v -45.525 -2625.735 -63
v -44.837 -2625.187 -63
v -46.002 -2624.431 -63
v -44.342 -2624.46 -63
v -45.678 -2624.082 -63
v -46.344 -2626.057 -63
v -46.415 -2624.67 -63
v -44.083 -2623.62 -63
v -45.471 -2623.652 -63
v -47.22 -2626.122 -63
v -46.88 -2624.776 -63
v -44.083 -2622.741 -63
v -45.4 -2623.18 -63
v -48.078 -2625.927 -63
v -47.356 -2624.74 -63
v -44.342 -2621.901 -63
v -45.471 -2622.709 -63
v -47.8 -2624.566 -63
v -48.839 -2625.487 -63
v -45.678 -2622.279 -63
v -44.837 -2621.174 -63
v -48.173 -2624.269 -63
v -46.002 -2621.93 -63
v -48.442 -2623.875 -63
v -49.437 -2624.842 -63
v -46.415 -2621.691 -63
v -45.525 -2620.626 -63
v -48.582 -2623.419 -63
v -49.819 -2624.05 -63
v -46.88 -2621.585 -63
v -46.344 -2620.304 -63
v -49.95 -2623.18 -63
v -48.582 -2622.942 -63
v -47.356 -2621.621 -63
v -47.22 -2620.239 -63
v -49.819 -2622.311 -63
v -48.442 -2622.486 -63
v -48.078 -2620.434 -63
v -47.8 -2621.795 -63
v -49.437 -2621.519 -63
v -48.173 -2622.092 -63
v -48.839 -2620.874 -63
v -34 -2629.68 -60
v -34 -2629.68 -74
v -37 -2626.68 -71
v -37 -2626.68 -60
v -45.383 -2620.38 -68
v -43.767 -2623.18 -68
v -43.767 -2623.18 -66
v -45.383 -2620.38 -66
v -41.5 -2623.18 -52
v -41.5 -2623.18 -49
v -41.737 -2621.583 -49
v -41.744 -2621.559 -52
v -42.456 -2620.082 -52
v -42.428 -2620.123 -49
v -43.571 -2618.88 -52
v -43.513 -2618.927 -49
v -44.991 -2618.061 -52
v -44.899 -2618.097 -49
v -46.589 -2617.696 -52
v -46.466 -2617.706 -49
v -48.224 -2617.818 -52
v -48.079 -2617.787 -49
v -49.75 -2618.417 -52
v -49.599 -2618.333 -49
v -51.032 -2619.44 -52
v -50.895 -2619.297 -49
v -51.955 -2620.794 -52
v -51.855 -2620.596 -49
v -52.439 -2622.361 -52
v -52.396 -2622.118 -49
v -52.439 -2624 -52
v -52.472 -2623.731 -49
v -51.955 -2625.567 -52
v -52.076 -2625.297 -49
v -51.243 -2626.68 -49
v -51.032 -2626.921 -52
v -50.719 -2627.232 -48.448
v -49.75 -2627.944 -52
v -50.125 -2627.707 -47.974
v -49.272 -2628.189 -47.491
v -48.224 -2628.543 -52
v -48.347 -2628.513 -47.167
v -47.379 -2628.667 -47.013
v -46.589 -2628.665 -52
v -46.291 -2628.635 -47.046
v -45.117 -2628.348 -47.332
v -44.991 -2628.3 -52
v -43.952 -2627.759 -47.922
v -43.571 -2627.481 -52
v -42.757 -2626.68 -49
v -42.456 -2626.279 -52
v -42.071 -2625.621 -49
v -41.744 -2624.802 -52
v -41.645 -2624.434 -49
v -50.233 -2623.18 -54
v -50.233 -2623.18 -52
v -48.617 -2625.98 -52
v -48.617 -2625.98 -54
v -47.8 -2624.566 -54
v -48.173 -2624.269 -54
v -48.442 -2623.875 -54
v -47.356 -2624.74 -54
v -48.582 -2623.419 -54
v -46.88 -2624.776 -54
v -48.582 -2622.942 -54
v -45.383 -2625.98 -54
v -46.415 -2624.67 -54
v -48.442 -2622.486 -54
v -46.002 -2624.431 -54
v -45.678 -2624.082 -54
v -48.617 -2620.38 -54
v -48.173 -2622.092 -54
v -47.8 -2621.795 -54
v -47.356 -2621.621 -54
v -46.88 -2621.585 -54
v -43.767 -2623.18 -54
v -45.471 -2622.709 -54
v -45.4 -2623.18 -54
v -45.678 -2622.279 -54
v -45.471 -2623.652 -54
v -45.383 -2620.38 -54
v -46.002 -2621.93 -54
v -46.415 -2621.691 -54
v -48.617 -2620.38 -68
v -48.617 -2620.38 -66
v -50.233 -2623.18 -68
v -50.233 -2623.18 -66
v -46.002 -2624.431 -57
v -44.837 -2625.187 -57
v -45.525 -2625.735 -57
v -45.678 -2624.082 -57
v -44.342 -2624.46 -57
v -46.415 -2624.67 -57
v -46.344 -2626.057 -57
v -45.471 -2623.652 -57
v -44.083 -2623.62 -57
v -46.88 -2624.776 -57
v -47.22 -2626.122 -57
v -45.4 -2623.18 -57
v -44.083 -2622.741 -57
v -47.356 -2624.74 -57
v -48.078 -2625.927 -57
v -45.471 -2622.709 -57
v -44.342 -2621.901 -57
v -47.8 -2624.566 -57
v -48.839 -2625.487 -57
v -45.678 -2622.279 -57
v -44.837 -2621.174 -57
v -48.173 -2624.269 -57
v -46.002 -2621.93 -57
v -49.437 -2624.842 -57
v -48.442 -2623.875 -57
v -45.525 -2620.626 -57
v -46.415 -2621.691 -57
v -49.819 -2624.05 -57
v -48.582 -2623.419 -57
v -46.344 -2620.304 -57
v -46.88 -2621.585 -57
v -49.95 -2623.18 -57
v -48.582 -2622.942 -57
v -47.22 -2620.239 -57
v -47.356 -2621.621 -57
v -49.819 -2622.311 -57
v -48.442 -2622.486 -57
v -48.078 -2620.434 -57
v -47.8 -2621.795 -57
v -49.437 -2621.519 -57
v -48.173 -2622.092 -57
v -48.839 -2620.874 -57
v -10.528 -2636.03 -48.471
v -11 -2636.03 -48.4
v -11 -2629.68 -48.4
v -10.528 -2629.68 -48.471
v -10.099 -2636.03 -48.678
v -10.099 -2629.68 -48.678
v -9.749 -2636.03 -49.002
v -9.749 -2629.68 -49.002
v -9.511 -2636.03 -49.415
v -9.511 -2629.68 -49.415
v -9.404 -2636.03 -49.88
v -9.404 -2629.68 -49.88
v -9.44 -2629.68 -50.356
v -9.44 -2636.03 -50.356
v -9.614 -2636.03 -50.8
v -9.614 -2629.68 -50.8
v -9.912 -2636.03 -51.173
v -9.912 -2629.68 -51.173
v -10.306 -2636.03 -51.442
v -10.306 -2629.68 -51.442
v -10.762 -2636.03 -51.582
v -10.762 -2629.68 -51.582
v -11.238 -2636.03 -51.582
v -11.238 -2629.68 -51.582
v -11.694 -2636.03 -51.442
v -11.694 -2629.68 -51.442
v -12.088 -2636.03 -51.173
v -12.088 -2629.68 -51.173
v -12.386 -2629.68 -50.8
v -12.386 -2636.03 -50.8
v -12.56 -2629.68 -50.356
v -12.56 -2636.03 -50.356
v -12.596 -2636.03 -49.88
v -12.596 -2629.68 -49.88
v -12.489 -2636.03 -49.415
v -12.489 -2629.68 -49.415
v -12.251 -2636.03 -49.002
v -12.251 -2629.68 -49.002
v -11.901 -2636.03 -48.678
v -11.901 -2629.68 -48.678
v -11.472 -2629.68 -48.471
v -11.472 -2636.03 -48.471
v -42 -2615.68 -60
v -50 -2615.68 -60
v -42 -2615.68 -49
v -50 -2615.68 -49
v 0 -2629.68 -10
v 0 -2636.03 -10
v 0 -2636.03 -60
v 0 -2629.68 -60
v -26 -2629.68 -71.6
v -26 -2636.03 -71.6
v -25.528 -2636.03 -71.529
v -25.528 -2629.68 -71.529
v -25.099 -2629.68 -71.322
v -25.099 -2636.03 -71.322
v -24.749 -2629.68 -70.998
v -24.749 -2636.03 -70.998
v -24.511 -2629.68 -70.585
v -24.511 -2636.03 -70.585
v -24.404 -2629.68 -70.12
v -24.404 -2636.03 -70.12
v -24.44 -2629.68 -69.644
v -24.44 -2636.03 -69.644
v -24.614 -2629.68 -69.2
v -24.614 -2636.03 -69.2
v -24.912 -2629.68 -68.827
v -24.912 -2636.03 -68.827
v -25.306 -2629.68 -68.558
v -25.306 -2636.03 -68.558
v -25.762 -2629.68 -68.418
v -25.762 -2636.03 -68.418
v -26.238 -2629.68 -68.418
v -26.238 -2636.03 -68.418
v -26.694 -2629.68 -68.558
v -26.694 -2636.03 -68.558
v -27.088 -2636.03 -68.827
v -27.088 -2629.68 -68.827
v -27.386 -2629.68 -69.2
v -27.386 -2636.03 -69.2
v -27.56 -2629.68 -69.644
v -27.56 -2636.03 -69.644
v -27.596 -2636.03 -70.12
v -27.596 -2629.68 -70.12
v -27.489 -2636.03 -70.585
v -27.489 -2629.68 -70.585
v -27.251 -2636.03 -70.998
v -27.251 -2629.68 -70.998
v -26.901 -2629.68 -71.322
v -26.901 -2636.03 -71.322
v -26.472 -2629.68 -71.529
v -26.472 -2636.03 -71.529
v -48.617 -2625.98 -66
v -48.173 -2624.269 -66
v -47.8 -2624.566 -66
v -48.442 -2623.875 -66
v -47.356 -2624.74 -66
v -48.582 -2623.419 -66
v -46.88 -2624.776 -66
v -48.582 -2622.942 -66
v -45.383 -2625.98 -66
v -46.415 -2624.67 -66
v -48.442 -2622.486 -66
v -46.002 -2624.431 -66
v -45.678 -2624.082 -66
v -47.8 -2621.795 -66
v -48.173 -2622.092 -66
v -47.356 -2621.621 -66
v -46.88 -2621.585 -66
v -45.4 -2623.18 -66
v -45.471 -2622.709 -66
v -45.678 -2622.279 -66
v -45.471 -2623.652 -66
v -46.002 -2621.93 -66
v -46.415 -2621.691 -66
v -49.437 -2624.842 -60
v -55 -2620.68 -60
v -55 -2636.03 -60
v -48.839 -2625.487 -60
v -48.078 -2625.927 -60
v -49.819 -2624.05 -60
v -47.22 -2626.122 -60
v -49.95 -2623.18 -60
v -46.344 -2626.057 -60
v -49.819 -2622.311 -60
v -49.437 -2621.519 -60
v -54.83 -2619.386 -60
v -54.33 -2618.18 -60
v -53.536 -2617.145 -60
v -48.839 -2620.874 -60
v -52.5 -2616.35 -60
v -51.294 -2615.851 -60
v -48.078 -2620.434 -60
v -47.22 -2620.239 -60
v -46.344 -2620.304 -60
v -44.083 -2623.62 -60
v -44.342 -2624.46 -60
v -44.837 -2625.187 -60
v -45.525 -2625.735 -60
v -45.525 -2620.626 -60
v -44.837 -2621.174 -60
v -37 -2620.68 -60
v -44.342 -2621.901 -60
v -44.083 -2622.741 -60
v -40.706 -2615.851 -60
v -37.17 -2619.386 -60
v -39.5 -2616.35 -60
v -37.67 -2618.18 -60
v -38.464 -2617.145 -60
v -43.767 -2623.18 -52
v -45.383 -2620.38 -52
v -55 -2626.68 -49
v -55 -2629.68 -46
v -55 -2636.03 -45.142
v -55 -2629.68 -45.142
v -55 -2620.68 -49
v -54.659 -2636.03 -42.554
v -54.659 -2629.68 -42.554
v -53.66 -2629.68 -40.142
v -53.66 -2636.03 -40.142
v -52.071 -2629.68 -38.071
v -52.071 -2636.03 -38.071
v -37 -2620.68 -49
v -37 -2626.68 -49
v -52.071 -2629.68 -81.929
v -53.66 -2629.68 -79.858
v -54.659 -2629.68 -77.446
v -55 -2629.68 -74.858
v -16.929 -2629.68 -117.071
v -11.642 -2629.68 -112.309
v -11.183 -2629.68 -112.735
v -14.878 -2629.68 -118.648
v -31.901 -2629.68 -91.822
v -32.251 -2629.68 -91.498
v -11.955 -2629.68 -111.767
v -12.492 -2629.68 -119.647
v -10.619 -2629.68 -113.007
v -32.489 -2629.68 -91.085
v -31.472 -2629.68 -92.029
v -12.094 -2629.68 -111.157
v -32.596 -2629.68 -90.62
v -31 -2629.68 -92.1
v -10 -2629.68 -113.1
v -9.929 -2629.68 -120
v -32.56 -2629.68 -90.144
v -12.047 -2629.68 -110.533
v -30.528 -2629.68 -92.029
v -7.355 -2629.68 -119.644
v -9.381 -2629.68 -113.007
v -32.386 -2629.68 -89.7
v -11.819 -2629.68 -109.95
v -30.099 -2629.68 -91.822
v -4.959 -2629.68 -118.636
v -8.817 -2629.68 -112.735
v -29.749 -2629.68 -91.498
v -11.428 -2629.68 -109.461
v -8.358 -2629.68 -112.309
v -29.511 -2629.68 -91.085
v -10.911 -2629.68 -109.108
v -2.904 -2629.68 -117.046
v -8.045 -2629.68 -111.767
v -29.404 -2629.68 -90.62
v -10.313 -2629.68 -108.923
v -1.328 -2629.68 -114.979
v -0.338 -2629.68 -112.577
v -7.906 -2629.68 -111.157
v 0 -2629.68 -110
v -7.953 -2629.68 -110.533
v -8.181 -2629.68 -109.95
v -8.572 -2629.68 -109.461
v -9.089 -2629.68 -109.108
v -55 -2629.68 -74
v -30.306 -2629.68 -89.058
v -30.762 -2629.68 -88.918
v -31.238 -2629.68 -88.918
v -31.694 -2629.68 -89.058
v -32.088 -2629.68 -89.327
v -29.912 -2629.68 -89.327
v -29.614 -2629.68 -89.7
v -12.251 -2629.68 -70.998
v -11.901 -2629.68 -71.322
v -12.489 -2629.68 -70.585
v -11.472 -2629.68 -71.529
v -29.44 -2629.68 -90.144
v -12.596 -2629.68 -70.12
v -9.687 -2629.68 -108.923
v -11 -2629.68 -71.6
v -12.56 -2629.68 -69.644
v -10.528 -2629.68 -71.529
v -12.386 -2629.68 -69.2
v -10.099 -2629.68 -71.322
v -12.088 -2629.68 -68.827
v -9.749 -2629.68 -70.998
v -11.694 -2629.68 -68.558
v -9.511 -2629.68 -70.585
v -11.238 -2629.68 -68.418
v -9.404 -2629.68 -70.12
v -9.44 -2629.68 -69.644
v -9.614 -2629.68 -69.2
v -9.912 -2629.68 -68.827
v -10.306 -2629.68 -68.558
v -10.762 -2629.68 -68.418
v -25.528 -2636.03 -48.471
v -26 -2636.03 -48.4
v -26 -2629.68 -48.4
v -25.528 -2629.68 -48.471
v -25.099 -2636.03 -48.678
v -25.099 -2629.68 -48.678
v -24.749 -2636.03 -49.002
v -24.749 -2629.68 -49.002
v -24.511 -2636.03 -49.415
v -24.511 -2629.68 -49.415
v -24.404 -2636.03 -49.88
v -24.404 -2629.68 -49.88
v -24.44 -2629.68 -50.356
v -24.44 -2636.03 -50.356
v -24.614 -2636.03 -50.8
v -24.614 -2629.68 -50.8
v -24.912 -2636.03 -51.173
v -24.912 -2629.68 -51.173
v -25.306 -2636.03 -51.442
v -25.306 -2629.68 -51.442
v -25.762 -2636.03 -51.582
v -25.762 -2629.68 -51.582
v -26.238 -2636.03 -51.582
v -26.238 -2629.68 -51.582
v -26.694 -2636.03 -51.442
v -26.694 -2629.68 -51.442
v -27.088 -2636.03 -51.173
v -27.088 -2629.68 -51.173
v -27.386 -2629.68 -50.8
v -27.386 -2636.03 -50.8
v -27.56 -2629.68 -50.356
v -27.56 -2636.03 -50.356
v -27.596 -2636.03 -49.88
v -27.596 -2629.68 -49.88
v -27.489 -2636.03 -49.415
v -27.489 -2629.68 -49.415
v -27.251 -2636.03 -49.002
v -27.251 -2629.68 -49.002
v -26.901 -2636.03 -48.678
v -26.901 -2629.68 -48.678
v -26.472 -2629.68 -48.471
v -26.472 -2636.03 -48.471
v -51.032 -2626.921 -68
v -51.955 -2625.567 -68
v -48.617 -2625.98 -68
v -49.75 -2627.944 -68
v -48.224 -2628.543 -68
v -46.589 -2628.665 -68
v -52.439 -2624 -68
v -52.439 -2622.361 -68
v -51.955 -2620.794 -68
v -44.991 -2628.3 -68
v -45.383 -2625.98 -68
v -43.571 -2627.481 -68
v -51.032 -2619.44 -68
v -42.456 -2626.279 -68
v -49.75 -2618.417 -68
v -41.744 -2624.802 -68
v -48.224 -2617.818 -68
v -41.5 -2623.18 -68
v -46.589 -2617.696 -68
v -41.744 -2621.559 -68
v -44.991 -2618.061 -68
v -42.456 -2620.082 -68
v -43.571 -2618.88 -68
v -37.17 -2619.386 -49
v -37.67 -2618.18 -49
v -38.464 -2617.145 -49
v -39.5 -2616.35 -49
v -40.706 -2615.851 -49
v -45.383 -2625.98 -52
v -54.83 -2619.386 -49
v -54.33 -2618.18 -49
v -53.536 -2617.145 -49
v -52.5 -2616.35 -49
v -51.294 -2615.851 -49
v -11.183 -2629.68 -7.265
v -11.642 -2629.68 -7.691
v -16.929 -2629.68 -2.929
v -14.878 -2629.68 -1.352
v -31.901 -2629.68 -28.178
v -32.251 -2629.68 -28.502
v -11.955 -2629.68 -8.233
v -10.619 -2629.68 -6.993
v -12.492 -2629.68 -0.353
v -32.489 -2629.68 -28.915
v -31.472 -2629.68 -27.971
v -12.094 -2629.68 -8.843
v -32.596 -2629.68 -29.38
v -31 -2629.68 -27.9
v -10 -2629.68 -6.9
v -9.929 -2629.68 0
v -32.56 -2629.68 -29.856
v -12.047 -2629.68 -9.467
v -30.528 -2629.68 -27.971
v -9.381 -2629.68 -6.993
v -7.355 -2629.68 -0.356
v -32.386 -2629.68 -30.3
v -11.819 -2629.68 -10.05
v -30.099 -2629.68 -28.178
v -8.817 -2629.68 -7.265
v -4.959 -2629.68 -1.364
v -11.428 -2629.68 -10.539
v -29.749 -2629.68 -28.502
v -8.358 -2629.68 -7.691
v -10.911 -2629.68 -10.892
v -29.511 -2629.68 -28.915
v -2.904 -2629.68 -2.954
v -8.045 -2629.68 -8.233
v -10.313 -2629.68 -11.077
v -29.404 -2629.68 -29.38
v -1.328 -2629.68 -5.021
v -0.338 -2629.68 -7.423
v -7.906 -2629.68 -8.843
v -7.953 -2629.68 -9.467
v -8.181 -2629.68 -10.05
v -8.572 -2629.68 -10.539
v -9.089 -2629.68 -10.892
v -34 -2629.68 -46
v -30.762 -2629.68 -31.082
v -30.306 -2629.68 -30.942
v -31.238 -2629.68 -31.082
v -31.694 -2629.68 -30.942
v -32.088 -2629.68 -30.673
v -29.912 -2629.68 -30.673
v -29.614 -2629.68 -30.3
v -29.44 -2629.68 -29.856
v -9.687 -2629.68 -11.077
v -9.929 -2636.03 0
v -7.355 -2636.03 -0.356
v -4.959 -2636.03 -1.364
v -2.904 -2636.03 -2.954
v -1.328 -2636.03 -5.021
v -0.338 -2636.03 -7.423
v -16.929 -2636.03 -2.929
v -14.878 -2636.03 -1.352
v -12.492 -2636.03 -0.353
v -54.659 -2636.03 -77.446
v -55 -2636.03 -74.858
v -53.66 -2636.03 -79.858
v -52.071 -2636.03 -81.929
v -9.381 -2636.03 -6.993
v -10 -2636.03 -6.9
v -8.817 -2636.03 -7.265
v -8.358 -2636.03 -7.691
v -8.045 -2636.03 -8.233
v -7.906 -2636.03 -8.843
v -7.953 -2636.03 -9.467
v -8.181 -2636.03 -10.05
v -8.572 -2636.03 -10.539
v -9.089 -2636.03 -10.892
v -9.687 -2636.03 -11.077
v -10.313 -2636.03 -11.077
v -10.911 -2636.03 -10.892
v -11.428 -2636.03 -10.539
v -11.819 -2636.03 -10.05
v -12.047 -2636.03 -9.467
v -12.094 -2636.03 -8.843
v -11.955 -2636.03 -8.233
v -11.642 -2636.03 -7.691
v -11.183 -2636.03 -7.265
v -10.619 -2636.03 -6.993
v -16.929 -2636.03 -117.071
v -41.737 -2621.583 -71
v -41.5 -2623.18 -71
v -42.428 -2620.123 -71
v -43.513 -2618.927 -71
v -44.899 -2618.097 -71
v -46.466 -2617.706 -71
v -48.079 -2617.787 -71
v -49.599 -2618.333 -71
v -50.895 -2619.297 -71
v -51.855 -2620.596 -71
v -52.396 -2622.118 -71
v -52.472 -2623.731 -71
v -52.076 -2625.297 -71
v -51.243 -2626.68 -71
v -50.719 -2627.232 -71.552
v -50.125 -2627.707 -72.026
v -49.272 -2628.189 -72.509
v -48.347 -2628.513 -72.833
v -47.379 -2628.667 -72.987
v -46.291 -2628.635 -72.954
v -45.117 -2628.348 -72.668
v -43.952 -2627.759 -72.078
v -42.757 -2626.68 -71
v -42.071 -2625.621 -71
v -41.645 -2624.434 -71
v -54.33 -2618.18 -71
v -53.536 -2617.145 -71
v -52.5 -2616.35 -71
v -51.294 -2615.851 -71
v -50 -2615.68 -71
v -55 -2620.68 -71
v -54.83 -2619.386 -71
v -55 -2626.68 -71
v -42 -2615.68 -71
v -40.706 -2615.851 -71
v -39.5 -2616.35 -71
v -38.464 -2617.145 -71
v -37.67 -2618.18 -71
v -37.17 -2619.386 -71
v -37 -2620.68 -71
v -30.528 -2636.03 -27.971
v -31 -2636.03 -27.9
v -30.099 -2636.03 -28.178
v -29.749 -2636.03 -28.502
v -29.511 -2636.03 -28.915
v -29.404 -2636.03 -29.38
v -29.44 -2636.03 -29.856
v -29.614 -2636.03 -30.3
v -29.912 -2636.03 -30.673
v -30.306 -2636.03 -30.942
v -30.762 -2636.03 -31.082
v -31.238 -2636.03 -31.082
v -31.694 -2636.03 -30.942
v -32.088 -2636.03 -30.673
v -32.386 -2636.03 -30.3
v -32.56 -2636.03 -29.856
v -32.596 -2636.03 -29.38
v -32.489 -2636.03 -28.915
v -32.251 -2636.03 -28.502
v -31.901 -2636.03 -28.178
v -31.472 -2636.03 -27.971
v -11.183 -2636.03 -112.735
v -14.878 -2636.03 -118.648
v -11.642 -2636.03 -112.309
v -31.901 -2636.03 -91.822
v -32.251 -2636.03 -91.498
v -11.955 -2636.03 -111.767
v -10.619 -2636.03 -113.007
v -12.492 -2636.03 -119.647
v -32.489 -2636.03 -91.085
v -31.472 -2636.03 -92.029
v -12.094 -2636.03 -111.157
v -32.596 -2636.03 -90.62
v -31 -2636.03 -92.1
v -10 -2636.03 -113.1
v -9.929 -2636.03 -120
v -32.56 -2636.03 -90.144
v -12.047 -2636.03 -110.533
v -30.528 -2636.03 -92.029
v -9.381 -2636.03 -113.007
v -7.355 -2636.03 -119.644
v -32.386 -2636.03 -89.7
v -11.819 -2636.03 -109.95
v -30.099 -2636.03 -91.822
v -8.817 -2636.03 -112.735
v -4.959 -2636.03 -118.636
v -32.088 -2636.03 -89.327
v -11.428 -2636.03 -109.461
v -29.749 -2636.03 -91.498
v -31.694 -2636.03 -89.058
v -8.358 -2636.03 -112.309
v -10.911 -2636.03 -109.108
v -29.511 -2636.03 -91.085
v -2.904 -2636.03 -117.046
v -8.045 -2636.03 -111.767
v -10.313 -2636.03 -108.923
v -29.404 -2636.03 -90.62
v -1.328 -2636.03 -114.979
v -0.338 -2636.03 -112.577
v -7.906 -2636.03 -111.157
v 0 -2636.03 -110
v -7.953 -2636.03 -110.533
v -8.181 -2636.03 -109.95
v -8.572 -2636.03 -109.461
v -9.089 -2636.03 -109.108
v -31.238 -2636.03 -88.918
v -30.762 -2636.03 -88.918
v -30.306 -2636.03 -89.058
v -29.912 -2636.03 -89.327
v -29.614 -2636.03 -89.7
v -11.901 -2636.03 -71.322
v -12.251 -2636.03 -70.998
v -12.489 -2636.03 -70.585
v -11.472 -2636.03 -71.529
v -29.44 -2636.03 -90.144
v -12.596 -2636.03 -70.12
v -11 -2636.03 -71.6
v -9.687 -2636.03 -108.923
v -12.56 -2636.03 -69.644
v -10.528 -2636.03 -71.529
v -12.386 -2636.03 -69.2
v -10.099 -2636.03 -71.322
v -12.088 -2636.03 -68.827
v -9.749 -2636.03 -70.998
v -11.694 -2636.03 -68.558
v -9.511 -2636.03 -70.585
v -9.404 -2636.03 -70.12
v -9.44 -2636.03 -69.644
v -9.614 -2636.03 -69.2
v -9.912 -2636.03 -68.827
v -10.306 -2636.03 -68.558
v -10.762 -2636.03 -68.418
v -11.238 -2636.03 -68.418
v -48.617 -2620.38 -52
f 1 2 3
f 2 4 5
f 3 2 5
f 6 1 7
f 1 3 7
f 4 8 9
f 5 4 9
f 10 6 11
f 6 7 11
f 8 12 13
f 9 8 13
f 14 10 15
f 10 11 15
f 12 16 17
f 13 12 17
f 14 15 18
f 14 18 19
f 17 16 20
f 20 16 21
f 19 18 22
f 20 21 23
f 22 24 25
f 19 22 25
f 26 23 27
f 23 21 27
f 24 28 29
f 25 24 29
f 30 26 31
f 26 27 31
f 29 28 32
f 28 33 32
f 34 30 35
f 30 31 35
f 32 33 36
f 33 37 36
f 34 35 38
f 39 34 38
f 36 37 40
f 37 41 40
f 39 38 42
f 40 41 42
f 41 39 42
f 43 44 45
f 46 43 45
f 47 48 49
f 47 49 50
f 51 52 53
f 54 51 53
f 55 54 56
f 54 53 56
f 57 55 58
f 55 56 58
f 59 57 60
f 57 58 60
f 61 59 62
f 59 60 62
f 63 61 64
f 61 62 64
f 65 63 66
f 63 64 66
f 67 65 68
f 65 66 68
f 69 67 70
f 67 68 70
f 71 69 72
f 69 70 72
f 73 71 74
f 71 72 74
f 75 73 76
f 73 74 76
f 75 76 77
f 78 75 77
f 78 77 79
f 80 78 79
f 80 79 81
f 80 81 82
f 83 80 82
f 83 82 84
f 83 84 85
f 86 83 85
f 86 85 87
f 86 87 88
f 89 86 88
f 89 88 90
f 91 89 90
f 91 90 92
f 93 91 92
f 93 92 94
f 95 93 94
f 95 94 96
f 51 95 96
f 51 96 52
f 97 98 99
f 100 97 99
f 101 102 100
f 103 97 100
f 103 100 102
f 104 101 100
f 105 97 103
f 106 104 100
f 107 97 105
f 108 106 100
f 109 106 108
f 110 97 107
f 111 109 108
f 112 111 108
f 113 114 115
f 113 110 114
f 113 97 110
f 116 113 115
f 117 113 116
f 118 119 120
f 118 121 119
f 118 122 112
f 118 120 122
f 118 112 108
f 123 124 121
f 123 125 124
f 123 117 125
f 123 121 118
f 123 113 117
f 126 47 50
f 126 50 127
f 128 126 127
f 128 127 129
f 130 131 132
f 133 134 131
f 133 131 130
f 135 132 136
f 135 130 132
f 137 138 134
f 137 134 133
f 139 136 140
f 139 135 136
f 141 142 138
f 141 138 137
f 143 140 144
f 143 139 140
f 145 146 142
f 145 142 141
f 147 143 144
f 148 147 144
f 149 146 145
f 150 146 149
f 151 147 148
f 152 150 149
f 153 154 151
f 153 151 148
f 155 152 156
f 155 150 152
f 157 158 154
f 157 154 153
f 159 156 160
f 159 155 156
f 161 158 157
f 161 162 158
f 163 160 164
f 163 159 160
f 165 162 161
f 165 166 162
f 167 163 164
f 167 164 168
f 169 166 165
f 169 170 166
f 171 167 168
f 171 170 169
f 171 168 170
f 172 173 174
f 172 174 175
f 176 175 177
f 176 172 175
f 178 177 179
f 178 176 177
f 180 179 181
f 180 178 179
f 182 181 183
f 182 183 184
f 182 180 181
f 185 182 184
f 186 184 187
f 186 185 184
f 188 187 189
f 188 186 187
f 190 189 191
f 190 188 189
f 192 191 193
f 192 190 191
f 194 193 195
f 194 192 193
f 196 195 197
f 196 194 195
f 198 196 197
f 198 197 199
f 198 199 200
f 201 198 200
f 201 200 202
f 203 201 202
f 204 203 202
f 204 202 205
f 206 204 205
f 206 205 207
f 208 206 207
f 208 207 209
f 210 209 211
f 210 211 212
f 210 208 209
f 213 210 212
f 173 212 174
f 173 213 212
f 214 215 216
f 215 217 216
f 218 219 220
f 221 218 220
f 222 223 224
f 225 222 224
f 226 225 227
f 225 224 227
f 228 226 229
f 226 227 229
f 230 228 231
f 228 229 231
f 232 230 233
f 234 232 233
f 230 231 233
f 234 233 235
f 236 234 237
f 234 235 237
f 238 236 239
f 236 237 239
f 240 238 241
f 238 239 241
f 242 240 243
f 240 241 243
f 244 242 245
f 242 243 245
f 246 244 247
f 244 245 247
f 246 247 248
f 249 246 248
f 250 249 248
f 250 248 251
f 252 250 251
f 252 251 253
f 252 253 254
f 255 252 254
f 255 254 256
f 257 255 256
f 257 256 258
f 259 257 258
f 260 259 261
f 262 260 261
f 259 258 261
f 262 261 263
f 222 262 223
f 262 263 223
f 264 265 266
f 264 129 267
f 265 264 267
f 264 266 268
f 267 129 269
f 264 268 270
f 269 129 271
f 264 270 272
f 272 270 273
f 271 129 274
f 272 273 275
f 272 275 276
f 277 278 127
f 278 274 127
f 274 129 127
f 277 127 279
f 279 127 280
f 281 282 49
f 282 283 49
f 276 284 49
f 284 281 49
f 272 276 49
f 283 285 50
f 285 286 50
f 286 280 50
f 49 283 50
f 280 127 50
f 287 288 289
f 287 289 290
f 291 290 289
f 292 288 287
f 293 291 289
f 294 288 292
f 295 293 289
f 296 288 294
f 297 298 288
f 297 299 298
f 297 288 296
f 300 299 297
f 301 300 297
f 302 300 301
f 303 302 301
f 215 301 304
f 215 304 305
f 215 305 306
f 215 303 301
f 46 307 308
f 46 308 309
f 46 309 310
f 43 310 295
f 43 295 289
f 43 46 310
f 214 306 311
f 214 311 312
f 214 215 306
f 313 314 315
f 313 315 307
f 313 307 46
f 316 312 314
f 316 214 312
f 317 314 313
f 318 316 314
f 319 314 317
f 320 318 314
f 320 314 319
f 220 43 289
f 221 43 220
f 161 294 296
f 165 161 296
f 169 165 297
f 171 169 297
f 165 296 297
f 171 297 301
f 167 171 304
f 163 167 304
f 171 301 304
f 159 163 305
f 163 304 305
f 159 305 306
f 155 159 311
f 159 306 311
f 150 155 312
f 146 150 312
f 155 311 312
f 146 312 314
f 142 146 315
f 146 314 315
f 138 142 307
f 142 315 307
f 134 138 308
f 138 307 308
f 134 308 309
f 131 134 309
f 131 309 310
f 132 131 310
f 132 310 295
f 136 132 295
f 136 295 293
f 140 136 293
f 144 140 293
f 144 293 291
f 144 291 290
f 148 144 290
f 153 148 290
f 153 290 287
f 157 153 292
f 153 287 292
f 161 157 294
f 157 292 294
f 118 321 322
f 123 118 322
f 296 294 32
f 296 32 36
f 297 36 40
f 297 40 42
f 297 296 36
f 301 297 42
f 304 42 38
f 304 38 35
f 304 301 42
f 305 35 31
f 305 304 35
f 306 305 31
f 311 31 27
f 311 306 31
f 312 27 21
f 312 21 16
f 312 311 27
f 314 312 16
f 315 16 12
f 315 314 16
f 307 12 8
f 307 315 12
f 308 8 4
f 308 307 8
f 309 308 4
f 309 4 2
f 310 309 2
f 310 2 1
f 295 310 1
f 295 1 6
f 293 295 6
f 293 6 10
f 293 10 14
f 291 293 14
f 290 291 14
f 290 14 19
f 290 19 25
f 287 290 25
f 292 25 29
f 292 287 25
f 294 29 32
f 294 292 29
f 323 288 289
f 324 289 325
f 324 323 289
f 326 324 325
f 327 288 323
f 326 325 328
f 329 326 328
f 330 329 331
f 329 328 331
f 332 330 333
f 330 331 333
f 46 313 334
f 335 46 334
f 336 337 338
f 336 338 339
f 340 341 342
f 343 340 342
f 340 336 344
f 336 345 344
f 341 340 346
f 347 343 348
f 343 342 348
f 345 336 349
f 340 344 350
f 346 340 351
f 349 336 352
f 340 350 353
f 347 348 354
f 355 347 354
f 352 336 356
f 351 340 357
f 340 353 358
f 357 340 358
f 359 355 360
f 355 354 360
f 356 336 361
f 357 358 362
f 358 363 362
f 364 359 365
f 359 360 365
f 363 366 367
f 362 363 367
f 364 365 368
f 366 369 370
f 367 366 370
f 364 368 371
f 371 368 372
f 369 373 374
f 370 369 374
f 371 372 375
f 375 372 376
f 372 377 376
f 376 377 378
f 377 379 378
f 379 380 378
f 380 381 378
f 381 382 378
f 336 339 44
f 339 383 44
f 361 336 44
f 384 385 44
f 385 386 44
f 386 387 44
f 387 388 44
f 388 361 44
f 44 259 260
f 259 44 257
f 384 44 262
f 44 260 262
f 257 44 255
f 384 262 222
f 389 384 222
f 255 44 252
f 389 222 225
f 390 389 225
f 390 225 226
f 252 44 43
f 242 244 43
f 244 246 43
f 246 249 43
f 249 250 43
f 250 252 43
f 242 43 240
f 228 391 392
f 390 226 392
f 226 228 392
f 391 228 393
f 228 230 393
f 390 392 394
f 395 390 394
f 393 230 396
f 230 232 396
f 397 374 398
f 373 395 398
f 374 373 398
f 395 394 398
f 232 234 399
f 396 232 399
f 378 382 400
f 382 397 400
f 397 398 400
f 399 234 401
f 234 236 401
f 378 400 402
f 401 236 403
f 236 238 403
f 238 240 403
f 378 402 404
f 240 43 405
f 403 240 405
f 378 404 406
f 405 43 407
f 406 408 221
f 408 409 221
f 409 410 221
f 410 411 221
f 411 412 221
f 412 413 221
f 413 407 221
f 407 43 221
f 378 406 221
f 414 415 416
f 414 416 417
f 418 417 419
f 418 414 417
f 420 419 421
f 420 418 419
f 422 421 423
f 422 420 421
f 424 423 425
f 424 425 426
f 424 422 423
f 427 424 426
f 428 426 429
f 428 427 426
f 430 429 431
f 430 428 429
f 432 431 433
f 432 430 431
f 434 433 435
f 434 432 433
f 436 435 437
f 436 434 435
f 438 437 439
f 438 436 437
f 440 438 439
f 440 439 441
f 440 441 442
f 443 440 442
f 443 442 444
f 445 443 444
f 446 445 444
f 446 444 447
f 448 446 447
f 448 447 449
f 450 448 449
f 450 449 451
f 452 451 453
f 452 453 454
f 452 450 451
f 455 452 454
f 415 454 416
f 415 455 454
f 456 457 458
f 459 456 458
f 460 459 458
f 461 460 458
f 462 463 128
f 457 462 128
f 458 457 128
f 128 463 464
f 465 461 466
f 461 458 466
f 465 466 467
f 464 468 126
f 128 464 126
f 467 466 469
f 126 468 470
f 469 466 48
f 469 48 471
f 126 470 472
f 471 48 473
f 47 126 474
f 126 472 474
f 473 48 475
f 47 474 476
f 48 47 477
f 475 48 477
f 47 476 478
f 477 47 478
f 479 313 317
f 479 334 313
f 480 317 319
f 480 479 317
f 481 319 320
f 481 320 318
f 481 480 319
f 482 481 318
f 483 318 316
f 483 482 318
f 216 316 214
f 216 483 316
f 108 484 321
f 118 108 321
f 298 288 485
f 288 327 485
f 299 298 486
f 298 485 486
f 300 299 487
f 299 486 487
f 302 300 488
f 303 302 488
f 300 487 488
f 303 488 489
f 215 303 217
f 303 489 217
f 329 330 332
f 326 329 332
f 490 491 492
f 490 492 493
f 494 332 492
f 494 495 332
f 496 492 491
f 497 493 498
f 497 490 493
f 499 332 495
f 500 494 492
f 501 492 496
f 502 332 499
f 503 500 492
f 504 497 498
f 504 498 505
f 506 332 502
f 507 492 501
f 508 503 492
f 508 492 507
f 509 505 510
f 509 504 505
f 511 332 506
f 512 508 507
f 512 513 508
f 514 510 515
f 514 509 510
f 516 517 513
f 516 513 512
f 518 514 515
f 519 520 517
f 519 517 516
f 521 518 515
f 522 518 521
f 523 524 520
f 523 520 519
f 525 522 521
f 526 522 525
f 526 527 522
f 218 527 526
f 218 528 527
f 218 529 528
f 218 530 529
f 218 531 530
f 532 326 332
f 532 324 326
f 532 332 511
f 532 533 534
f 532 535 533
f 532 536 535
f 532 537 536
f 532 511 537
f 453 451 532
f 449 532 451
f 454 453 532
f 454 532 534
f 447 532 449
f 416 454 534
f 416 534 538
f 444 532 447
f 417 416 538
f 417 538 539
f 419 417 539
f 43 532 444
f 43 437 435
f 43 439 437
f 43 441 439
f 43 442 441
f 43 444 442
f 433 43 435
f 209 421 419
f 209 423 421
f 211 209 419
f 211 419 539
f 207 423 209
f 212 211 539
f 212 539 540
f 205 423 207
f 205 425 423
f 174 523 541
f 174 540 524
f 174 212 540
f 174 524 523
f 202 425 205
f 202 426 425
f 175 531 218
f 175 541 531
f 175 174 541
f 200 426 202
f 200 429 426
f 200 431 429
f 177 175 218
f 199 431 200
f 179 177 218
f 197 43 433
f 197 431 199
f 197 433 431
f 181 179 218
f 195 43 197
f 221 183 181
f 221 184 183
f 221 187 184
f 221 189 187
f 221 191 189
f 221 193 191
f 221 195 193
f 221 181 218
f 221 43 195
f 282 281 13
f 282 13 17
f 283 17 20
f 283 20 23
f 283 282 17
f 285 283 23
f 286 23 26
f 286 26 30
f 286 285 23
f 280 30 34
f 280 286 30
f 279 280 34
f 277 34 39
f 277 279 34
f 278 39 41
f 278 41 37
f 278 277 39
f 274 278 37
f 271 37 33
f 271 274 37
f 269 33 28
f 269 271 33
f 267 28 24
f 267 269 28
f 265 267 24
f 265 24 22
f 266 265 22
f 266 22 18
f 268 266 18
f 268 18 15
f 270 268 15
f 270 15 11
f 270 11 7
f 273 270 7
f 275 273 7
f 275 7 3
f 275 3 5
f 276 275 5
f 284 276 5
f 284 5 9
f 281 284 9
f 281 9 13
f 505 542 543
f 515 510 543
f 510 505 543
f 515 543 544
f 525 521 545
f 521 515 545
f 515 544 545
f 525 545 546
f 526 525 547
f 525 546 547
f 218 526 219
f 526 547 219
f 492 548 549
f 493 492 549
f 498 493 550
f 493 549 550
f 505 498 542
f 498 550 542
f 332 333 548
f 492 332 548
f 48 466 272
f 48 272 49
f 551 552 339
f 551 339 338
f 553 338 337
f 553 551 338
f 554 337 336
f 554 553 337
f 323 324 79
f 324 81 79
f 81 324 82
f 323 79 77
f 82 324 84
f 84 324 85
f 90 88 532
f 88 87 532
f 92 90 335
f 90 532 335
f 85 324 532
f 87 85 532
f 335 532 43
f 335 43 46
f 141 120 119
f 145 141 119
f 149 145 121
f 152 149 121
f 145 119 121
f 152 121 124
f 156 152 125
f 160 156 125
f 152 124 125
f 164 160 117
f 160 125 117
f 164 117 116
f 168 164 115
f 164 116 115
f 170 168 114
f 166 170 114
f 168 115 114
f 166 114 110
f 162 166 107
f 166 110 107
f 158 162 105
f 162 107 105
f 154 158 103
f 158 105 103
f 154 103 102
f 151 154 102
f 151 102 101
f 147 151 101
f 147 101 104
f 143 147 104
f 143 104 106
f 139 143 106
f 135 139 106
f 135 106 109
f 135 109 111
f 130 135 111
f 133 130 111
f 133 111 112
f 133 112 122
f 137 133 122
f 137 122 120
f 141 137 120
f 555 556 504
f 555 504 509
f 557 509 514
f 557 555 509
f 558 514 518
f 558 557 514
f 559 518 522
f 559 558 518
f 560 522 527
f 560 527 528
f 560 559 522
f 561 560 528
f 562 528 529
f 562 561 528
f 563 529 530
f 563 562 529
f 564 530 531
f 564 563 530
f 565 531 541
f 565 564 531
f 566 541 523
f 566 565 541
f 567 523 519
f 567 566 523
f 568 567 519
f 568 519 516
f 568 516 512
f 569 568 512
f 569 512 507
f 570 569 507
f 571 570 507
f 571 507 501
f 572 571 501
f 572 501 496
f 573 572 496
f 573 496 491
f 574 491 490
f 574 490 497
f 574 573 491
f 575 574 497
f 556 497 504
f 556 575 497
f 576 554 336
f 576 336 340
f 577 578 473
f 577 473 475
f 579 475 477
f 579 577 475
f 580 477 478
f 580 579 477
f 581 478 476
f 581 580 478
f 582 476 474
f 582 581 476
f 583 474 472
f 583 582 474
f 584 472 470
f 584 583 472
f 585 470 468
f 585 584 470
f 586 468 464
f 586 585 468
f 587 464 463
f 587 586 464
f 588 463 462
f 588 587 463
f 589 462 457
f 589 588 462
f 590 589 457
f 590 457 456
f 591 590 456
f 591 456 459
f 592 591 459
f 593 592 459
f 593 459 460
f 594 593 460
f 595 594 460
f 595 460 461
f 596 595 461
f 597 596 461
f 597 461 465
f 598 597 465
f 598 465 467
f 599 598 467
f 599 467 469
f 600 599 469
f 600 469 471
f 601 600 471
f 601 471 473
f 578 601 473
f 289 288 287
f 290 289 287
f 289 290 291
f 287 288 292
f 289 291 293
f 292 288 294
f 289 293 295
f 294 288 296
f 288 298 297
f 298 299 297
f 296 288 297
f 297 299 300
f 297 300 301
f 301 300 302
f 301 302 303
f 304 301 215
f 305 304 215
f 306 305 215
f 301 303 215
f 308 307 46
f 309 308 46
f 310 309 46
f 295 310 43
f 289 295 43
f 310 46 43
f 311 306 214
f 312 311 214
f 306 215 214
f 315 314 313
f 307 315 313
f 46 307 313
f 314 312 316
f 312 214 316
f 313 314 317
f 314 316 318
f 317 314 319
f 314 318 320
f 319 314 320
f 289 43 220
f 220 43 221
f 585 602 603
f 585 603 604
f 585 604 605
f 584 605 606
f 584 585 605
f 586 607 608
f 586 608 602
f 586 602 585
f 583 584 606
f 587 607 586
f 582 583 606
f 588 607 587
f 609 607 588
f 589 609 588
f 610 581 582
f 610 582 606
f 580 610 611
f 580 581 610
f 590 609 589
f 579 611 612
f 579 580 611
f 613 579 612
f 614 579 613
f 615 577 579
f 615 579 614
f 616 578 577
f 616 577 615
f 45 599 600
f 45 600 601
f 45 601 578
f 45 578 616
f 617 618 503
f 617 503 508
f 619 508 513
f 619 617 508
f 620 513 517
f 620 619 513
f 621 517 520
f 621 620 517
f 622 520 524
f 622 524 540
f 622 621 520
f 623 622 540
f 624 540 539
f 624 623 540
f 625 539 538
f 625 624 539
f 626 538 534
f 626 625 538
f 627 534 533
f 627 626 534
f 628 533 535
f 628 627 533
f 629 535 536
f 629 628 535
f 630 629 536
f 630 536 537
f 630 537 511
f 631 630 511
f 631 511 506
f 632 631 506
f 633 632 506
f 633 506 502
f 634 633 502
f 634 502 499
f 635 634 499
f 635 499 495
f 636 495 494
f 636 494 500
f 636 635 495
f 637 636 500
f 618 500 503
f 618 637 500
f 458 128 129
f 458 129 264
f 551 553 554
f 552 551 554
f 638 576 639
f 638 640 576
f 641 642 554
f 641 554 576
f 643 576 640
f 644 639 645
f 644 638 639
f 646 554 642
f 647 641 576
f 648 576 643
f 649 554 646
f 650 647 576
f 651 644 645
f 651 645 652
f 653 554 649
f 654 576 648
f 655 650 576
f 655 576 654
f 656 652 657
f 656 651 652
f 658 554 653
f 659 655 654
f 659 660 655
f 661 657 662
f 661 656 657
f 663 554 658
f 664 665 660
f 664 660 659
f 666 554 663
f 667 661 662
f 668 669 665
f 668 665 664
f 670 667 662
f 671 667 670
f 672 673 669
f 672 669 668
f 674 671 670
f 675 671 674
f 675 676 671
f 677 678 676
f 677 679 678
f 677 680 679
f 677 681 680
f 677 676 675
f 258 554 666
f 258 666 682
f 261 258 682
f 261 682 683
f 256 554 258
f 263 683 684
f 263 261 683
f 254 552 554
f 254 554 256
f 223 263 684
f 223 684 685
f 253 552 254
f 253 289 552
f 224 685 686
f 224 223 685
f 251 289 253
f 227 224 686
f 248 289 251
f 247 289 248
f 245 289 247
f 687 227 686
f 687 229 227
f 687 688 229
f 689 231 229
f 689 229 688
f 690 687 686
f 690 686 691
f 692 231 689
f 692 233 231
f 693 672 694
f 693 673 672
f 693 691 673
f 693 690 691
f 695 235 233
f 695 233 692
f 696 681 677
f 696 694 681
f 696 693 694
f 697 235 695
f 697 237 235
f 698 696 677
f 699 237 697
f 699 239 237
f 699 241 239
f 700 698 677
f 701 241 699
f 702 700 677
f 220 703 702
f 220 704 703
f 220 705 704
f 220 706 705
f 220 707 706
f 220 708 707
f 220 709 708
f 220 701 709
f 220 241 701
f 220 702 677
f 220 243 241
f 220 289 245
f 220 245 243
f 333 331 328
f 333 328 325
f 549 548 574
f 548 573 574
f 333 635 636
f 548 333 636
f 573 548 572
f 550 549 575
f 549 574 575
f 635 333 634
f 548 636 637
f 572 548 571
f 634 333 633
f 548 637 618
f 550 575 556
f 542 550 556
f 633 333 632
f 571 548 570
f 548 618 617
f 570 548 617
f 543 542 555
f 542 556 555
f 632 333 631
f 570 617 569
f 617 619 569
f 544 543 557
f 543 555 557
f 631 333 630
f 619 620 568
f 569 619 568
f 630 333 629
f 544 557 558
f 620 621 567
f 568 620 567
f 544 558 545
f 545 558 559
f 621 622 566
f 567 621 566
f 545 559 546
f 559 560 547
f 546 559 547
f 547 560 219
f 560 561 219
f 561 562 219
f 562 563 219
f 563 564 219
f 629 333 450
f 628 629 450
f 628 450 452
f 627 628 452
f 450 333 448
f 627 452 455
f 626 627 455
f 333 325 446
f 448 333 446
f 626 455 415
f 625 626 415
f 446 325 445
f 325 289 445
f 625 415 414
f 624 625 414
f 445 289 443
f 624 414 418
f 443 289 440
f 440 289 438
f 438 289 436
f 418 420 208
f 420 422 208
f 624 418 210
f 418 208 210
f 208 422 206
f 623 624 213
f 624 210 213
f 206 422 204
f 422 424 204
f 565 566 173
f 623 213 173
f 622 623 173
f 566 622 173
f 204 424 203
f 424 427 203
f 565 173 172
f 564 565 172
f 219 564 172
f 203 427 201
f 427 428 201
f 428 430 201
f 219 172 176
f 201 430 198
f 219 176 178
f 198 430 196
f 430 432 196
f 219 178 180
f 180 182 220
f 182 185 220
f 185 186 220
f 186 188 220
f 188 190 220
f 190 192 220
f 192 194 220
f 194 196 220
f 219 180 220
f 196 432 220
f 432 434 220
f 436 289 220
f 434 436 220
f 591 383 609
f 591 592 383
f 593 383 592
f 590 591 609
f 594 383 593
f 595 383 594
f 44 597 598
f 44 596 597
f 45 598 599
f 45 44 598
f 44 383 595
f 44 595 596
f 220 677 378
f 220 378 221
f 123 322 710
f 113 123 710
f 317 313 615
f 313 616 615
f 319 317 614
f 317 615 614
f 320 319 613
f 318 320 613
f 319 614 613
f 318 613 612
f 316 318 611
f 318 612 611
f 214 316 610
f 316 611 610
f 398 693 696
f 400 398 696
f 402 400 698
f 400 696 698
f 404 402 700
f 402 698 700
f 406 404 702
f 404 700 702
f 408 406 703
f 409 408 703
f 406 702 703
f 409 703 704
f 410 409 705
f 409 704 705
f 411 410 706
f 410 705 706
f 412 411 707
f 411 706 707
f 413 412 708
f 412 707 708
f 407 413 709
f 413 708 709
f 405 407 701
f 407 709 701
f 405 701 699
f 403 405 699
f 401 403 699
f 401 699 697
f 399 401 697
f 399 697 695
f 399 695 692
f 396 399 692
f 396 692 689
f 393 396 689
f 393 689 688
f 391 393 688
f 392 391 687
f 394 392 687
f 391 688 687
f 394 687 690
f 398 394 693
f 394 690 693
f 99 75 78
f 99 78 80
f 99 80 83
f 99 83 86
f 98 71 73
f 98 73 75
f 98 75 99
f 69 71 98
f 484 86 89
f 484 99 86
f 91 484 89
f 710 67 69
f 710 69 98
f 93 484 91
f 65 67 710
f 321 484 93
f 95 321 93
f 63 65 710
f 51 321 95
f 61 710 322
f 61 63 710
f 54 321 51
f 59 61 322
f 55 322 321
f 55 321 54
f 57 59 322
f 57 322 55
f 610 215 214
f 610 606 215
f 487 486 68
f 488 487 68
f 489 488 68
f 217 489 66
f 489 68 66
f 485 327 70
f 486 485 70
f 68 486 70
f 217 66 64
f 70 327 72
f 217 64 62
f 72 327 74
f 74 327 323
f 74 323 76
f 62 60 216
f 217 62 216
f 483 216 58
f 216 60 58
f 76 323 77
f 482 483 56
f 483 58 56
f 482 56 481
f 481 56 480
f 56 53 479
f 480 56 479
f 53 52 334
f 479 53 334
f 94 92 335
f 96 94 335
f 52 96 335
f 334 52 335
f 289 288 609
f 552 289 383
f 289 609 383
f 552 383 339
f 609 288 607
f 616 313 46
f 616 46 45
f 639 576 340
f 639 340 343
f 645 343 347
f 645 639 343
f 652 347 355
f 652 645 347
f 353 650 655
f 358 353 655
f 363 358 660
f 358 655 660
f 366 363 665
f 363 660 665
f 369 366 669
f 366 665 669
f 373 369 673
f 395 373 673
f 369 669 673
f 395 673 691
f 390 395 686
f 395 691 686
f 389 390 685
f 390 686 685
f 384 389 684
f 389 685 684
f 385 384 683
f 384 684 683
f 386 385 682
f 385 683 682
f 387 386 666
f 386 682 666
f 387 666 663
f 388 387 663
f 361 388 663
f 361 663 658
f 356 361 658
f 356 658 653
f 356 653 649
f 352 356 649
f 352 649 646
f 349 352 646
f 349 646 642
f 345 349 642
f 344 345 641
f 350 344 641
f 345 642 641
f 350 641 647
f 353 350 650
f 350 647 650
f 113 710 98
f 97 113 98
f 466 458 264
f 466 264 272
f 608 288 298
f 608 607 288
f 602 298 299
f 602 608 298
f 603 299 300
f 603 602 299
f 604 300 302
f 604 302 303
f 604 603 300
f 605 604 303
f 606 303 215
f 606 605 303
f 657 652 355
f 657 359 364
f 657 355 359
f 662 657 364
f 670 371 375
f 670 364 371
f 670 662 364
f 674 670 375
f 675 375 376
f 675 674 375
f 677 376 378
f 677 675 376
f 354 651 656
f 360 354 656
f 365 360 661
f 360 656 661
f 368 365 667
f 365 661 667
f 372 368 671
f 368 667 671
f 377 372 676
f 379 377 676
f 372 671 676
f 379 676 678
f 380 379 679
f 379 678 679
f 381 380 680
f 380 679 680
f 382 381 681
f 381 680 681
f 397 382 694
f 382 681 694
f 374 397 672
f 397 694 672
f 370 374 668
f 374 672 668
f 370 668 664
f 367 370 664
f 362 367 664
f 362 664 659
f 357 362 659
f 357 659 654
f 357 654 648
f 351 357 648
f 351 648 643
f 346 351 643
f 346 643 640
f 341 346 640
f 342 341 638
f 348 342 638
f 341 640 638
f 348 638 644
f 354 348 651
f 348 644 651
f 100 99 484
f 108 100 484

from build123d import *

# Parameters (mm, degrees)
SKETCH1_R           = 2.1
SKETCH1_R_2         = 1.6
BOSS_EXTRUDE1_DEPTH = 6.35
SKETCH2_W           = 18
SKETCH2_H           = 11
BOSS_EXTRUDE2_DEPTH = 14
SKETCH3_R           = 5.5
CUT_EXTRUDE1_DEPTH  = 3
CHAMFER1_SIZE       = 3
FILLET2_R           = 10
FILLET3_R           = 5
CUT_EXTRUDE2_DEPTH  = 2
SKETCH5_R           = 1.6
CUT_EXTRUDE3_DEPTH  = 2638.157111638
SKETCH6_R           = 2.95
CUT_EXTRUDE4_DEPTH  = 3


with BuildPart() as part:
    # Sketch1 → Boss-Extrude1 (new body)
    with BuildSketch(Plane(origin=(251.886129178, -2636.030473787, -0.277944786), x_dir=(1, 0, 0), z_dir=(0, 1, 0))):
        Polygon((-265.886129178, -0.277944786), (-251.886129178, -0.277944786), (-251.886129178, 59.722055214), (-306.886129178, 59.722055214), (-306.886129178, 40.722055214), align=None)
        with Locations(Location((-261.886129178, 8.722055214, 0), (0, 0, 270))):
            Circle(SKETCH1_R, mode=Mode.SUBTRACT)
        with Locations(Location((-282.886129178, 29.222055214, 0), (0, 0, 270))):
            Circle(SKETCH1_R_2, mode=Mode.SUBTRACT)
        with Locations(Location((-262.886129178, 49.722055214, 0), (0, 0, 270))):
            Circle(SKETCH1_R_2, mode=Mode.SUBTRACT)
        with Locations(Location((-277.886129178, 49.722055214, 0), (0, 0, 270))):
            Circle(SKETCH1_R_2, mode=Mode.SUBTRACT)
    extrude(amount=BOSS_EXTRUDE1_DEPTH)

    # Sketch2 → Boss-Extrude2 (add)
    with BuildSketch(Plane(origin=(-55, -2629.680473787, -60), x_dir=(1, 0, 0), z_dir=(0, -1, 0))):
        with Locations((9, 5.5)):
            Rectangle(SKETCH2_W, SKETCH2_H)
    extrude(amount=-BOSS_EXTRUDE2_DEPTH)

    # Sketch3 → Cut-Extrude1 (cut)
    with BuildSketch(Plane.XY.offset(-49)):
        with Locations((-47, -2623.180473787)):
            Circle(SKETCH3_R)
    extrude(amount=-CUT_EXTRUDE1_DEPTH, mode=Mode.SUBTRACT)

    # Chamfer1
    # the kernel refuses this chamfer: 3 mm, written as the material it adds along each edge
    with BuildSketch(Plane(origin=(-37, -2629.680473787, -49), x_dir=(0, -0.02749587661065579, 0.9996219169112949), z_dir=(-1, 0, 0))) as chamfer1_piece_1_section:
        Polygon((CHAMFER1_SIZE * 0.999621916911, CHAMFER1_SIZE * 0.0274958766107), (-CHAMFER1_SIZE * 0.0274958766107, CHAMFER1_SIZE * 0.999621916911), (0, 0), align=None)
    chamfer1_piece_1 = extrude(amount=18, mode=Mode.PRIVATE)
    chamfer1_piece_1 = chamfer1_piece_1 - Plane(origin=(-47, -2623.180473787, -47.945016367), x_dir=(1, 0, 0), z_dir=(0, 0, 1)) * Cylinder(5.5, 48, mode=Mode.PRIVATE)
    add(chamfer1_piece_1)
    with BuildSketch(Plane(origin=(-37, -2629.680473787, -60), x_dir=(0.9996219169112948, -0.027495876610655785, 0), z_dir=(0, 0, 1))) as chamfer1_piece_2:
        Polygon((CHAMFER1_SIZE * 0.999621916911, CHAMFER1_SIZE * 0.0274958766107), (-CHAMFER1_SIZE * 0.0274958766107, CHAMFER1_SIZE * 0.999621916911), (0, 0), align=None)
    extrude(amount=11)
    with BuildSketch(Plane(origin=(-29.284951036, -2629.680473787, -49), x_dir=(0, -0.02749587661065579, 0.9996219169112949), z_dir=(-1, 0, 0))) as chamfer1_piece_3a_section:
        Polygon((CHAMFER1_SIZE * 0.999621916911, CHAMFER1_SIZE * 0.0274958766107), (-CHAMFER1_SIZE * 0.0274958766107, CHAMFER1_SIZE * 0.999621916911), (0, 0), align=None)
    chamfer1_piece_3a = extrude(amount=25.715048964, mode=Mode.PRIVATE)
    chamfer1_piece_3a = split(chamfer1_piece_3a, bisect_by=Plane(origin=(-37, -2628.691092907, -48.01061912), z_dir=(1, 0, 0)), keep=Keep.TOP, mode=Mode.PRIVATE)
    with BuildSketch(Plane(origin=(-37, -2629.680473787, -60), x_dir=(0.9996219169112948, -0.027495876610655785, 0), z_dir=(0, 0, 1))) as chamfer1_piece_3b_section:
        Polygon((CHAMFER1_SIZE * 0.999621916911, CHAMFER1_SIZE * 0.0274958766107), (-CHAMFER1_SIZE * 0.0274958766107, CHAMFER1_SIZE * 0.999621916911), (0, 0), align=None)
    chamfer1_piece_3b = extrude(amount=18.715048964, mode=Mode.PRIVATE)
    chamfer1_piece_3b = split(chamfer1_piece_3b, bisect_by=Plane(origin=(-36.01061912, -2628.691092907, -49), z_dir=(0, 0, 1)), keep=Keep.TOP, mode=Mode.PRIVATE)
    chamfer1_piece_3 = chamfer1_piece_3a & chamfer1_piece_3b
    add(chamfer1_piece_3)

    # Fillet2
    # the kernel refuses this fillet: 10 mm, written as the material it takes off along each edge
    with BuildSketch(Plane(origin=(-14, -2646.385812847, 0), x_dir=(1, 0, 0), z_dir=(0, 1, 0)), Plane(origin=(-55, -2646.385812847, -41), x_dir=(0.7071067811865518, 0, 0.7071067811865432), z_dir=(0, 1, 0))) as fillet2_piece_1:
        with BuildLine():
            CenterArc((FILLET2_R * 0.414213562373, FILLET2_R), FILLET2_R, 225, 45)
            Line((-FILLET2_R * 0.292893218813, FILLET2_R * 0.292893218813), (0, 0))
            Line((0, 0), (FILLET2_R * 0.414213562373, 0))
        make_face()
    extrude(amount=27.060678119, mode=Mode.SUBTRACT)
    with BuildSketch(Plane(origin=(0, -2661.030473787, 0), x_dir=(0, 0, -1), z_dir=(0, 1, 0))) as fillet2_piece_2:
        with BuildLine():
            CenterArc((FILLET2_R, FILLET2_R), FILLET2_R, 180, 90)
            Line((0, FILLET2_R), (0, 0))
            Line((0, 0), (FILLET2_R, 0))
        make_face()
    extrude(amount=56.35, mode=Mode.SUBTRACT)

    # Fillet3
    fillet3_edges = [part.edges().sort_by_distance(p)[0] for p in [
        (-37, -2615.680473787, -54.5),
        (-55, -2615.680473787, -54.5),
    ]]
    fillet(fillet3_edges, radius=FILLET3_R)

    # Sketch4 → Cut-Extrude2 (cut)
    with BuildSketch(Plane.XY.offset(-52)):
        Polygon((-45.383419246, -2625.980473787), (-43.766838493, -2623.180473787), (-45.383419246, -2620.380473787), (-48.616580754, -2620.380473787), (-50.233161507, -2623.180473787), (-48.616580754, -2625.980473787), align=None)
    extrude(amount=-CUT_EXTRUDE2_DEPTH, mode=Mode.SUBTRACT)

    # Sketch5 → Cut-Extrude3 (cut, through all)
    with BuildSketch(Plane.XY.offset(-54)):
        with Locations((-47, -2623.180473787)):
            Circle(SKETCH5_R)
    extrude(amount=-CUT_EXTRUDE3_DEPTH, mode=Mode.SUBTRACT)

    # Sketch6 → Cut-Extrude4 (cut)
    with BuildSketch(Plane(origin=(0, 0, -60), x_dir=(-1, 0, 0), z_dir=(0, 0, -1))):
        with Locations((47, -2623.180473787)):
            Circle(SKETCH6_R)
    extrude(amount=-CUT_EXTRUDE4_DEPTH, mode=Mode.SUBTRACT)


with BuildPart() as body_2:
    # Mirror2: mirrored copy
    add(part.part.mirror(Plane(origin=(0, -2629.680473787, -60), x_dir=(1, 0, 0), z_dir=(0, 0, 1))))


solid = Compound([part.part, body_2.part])
